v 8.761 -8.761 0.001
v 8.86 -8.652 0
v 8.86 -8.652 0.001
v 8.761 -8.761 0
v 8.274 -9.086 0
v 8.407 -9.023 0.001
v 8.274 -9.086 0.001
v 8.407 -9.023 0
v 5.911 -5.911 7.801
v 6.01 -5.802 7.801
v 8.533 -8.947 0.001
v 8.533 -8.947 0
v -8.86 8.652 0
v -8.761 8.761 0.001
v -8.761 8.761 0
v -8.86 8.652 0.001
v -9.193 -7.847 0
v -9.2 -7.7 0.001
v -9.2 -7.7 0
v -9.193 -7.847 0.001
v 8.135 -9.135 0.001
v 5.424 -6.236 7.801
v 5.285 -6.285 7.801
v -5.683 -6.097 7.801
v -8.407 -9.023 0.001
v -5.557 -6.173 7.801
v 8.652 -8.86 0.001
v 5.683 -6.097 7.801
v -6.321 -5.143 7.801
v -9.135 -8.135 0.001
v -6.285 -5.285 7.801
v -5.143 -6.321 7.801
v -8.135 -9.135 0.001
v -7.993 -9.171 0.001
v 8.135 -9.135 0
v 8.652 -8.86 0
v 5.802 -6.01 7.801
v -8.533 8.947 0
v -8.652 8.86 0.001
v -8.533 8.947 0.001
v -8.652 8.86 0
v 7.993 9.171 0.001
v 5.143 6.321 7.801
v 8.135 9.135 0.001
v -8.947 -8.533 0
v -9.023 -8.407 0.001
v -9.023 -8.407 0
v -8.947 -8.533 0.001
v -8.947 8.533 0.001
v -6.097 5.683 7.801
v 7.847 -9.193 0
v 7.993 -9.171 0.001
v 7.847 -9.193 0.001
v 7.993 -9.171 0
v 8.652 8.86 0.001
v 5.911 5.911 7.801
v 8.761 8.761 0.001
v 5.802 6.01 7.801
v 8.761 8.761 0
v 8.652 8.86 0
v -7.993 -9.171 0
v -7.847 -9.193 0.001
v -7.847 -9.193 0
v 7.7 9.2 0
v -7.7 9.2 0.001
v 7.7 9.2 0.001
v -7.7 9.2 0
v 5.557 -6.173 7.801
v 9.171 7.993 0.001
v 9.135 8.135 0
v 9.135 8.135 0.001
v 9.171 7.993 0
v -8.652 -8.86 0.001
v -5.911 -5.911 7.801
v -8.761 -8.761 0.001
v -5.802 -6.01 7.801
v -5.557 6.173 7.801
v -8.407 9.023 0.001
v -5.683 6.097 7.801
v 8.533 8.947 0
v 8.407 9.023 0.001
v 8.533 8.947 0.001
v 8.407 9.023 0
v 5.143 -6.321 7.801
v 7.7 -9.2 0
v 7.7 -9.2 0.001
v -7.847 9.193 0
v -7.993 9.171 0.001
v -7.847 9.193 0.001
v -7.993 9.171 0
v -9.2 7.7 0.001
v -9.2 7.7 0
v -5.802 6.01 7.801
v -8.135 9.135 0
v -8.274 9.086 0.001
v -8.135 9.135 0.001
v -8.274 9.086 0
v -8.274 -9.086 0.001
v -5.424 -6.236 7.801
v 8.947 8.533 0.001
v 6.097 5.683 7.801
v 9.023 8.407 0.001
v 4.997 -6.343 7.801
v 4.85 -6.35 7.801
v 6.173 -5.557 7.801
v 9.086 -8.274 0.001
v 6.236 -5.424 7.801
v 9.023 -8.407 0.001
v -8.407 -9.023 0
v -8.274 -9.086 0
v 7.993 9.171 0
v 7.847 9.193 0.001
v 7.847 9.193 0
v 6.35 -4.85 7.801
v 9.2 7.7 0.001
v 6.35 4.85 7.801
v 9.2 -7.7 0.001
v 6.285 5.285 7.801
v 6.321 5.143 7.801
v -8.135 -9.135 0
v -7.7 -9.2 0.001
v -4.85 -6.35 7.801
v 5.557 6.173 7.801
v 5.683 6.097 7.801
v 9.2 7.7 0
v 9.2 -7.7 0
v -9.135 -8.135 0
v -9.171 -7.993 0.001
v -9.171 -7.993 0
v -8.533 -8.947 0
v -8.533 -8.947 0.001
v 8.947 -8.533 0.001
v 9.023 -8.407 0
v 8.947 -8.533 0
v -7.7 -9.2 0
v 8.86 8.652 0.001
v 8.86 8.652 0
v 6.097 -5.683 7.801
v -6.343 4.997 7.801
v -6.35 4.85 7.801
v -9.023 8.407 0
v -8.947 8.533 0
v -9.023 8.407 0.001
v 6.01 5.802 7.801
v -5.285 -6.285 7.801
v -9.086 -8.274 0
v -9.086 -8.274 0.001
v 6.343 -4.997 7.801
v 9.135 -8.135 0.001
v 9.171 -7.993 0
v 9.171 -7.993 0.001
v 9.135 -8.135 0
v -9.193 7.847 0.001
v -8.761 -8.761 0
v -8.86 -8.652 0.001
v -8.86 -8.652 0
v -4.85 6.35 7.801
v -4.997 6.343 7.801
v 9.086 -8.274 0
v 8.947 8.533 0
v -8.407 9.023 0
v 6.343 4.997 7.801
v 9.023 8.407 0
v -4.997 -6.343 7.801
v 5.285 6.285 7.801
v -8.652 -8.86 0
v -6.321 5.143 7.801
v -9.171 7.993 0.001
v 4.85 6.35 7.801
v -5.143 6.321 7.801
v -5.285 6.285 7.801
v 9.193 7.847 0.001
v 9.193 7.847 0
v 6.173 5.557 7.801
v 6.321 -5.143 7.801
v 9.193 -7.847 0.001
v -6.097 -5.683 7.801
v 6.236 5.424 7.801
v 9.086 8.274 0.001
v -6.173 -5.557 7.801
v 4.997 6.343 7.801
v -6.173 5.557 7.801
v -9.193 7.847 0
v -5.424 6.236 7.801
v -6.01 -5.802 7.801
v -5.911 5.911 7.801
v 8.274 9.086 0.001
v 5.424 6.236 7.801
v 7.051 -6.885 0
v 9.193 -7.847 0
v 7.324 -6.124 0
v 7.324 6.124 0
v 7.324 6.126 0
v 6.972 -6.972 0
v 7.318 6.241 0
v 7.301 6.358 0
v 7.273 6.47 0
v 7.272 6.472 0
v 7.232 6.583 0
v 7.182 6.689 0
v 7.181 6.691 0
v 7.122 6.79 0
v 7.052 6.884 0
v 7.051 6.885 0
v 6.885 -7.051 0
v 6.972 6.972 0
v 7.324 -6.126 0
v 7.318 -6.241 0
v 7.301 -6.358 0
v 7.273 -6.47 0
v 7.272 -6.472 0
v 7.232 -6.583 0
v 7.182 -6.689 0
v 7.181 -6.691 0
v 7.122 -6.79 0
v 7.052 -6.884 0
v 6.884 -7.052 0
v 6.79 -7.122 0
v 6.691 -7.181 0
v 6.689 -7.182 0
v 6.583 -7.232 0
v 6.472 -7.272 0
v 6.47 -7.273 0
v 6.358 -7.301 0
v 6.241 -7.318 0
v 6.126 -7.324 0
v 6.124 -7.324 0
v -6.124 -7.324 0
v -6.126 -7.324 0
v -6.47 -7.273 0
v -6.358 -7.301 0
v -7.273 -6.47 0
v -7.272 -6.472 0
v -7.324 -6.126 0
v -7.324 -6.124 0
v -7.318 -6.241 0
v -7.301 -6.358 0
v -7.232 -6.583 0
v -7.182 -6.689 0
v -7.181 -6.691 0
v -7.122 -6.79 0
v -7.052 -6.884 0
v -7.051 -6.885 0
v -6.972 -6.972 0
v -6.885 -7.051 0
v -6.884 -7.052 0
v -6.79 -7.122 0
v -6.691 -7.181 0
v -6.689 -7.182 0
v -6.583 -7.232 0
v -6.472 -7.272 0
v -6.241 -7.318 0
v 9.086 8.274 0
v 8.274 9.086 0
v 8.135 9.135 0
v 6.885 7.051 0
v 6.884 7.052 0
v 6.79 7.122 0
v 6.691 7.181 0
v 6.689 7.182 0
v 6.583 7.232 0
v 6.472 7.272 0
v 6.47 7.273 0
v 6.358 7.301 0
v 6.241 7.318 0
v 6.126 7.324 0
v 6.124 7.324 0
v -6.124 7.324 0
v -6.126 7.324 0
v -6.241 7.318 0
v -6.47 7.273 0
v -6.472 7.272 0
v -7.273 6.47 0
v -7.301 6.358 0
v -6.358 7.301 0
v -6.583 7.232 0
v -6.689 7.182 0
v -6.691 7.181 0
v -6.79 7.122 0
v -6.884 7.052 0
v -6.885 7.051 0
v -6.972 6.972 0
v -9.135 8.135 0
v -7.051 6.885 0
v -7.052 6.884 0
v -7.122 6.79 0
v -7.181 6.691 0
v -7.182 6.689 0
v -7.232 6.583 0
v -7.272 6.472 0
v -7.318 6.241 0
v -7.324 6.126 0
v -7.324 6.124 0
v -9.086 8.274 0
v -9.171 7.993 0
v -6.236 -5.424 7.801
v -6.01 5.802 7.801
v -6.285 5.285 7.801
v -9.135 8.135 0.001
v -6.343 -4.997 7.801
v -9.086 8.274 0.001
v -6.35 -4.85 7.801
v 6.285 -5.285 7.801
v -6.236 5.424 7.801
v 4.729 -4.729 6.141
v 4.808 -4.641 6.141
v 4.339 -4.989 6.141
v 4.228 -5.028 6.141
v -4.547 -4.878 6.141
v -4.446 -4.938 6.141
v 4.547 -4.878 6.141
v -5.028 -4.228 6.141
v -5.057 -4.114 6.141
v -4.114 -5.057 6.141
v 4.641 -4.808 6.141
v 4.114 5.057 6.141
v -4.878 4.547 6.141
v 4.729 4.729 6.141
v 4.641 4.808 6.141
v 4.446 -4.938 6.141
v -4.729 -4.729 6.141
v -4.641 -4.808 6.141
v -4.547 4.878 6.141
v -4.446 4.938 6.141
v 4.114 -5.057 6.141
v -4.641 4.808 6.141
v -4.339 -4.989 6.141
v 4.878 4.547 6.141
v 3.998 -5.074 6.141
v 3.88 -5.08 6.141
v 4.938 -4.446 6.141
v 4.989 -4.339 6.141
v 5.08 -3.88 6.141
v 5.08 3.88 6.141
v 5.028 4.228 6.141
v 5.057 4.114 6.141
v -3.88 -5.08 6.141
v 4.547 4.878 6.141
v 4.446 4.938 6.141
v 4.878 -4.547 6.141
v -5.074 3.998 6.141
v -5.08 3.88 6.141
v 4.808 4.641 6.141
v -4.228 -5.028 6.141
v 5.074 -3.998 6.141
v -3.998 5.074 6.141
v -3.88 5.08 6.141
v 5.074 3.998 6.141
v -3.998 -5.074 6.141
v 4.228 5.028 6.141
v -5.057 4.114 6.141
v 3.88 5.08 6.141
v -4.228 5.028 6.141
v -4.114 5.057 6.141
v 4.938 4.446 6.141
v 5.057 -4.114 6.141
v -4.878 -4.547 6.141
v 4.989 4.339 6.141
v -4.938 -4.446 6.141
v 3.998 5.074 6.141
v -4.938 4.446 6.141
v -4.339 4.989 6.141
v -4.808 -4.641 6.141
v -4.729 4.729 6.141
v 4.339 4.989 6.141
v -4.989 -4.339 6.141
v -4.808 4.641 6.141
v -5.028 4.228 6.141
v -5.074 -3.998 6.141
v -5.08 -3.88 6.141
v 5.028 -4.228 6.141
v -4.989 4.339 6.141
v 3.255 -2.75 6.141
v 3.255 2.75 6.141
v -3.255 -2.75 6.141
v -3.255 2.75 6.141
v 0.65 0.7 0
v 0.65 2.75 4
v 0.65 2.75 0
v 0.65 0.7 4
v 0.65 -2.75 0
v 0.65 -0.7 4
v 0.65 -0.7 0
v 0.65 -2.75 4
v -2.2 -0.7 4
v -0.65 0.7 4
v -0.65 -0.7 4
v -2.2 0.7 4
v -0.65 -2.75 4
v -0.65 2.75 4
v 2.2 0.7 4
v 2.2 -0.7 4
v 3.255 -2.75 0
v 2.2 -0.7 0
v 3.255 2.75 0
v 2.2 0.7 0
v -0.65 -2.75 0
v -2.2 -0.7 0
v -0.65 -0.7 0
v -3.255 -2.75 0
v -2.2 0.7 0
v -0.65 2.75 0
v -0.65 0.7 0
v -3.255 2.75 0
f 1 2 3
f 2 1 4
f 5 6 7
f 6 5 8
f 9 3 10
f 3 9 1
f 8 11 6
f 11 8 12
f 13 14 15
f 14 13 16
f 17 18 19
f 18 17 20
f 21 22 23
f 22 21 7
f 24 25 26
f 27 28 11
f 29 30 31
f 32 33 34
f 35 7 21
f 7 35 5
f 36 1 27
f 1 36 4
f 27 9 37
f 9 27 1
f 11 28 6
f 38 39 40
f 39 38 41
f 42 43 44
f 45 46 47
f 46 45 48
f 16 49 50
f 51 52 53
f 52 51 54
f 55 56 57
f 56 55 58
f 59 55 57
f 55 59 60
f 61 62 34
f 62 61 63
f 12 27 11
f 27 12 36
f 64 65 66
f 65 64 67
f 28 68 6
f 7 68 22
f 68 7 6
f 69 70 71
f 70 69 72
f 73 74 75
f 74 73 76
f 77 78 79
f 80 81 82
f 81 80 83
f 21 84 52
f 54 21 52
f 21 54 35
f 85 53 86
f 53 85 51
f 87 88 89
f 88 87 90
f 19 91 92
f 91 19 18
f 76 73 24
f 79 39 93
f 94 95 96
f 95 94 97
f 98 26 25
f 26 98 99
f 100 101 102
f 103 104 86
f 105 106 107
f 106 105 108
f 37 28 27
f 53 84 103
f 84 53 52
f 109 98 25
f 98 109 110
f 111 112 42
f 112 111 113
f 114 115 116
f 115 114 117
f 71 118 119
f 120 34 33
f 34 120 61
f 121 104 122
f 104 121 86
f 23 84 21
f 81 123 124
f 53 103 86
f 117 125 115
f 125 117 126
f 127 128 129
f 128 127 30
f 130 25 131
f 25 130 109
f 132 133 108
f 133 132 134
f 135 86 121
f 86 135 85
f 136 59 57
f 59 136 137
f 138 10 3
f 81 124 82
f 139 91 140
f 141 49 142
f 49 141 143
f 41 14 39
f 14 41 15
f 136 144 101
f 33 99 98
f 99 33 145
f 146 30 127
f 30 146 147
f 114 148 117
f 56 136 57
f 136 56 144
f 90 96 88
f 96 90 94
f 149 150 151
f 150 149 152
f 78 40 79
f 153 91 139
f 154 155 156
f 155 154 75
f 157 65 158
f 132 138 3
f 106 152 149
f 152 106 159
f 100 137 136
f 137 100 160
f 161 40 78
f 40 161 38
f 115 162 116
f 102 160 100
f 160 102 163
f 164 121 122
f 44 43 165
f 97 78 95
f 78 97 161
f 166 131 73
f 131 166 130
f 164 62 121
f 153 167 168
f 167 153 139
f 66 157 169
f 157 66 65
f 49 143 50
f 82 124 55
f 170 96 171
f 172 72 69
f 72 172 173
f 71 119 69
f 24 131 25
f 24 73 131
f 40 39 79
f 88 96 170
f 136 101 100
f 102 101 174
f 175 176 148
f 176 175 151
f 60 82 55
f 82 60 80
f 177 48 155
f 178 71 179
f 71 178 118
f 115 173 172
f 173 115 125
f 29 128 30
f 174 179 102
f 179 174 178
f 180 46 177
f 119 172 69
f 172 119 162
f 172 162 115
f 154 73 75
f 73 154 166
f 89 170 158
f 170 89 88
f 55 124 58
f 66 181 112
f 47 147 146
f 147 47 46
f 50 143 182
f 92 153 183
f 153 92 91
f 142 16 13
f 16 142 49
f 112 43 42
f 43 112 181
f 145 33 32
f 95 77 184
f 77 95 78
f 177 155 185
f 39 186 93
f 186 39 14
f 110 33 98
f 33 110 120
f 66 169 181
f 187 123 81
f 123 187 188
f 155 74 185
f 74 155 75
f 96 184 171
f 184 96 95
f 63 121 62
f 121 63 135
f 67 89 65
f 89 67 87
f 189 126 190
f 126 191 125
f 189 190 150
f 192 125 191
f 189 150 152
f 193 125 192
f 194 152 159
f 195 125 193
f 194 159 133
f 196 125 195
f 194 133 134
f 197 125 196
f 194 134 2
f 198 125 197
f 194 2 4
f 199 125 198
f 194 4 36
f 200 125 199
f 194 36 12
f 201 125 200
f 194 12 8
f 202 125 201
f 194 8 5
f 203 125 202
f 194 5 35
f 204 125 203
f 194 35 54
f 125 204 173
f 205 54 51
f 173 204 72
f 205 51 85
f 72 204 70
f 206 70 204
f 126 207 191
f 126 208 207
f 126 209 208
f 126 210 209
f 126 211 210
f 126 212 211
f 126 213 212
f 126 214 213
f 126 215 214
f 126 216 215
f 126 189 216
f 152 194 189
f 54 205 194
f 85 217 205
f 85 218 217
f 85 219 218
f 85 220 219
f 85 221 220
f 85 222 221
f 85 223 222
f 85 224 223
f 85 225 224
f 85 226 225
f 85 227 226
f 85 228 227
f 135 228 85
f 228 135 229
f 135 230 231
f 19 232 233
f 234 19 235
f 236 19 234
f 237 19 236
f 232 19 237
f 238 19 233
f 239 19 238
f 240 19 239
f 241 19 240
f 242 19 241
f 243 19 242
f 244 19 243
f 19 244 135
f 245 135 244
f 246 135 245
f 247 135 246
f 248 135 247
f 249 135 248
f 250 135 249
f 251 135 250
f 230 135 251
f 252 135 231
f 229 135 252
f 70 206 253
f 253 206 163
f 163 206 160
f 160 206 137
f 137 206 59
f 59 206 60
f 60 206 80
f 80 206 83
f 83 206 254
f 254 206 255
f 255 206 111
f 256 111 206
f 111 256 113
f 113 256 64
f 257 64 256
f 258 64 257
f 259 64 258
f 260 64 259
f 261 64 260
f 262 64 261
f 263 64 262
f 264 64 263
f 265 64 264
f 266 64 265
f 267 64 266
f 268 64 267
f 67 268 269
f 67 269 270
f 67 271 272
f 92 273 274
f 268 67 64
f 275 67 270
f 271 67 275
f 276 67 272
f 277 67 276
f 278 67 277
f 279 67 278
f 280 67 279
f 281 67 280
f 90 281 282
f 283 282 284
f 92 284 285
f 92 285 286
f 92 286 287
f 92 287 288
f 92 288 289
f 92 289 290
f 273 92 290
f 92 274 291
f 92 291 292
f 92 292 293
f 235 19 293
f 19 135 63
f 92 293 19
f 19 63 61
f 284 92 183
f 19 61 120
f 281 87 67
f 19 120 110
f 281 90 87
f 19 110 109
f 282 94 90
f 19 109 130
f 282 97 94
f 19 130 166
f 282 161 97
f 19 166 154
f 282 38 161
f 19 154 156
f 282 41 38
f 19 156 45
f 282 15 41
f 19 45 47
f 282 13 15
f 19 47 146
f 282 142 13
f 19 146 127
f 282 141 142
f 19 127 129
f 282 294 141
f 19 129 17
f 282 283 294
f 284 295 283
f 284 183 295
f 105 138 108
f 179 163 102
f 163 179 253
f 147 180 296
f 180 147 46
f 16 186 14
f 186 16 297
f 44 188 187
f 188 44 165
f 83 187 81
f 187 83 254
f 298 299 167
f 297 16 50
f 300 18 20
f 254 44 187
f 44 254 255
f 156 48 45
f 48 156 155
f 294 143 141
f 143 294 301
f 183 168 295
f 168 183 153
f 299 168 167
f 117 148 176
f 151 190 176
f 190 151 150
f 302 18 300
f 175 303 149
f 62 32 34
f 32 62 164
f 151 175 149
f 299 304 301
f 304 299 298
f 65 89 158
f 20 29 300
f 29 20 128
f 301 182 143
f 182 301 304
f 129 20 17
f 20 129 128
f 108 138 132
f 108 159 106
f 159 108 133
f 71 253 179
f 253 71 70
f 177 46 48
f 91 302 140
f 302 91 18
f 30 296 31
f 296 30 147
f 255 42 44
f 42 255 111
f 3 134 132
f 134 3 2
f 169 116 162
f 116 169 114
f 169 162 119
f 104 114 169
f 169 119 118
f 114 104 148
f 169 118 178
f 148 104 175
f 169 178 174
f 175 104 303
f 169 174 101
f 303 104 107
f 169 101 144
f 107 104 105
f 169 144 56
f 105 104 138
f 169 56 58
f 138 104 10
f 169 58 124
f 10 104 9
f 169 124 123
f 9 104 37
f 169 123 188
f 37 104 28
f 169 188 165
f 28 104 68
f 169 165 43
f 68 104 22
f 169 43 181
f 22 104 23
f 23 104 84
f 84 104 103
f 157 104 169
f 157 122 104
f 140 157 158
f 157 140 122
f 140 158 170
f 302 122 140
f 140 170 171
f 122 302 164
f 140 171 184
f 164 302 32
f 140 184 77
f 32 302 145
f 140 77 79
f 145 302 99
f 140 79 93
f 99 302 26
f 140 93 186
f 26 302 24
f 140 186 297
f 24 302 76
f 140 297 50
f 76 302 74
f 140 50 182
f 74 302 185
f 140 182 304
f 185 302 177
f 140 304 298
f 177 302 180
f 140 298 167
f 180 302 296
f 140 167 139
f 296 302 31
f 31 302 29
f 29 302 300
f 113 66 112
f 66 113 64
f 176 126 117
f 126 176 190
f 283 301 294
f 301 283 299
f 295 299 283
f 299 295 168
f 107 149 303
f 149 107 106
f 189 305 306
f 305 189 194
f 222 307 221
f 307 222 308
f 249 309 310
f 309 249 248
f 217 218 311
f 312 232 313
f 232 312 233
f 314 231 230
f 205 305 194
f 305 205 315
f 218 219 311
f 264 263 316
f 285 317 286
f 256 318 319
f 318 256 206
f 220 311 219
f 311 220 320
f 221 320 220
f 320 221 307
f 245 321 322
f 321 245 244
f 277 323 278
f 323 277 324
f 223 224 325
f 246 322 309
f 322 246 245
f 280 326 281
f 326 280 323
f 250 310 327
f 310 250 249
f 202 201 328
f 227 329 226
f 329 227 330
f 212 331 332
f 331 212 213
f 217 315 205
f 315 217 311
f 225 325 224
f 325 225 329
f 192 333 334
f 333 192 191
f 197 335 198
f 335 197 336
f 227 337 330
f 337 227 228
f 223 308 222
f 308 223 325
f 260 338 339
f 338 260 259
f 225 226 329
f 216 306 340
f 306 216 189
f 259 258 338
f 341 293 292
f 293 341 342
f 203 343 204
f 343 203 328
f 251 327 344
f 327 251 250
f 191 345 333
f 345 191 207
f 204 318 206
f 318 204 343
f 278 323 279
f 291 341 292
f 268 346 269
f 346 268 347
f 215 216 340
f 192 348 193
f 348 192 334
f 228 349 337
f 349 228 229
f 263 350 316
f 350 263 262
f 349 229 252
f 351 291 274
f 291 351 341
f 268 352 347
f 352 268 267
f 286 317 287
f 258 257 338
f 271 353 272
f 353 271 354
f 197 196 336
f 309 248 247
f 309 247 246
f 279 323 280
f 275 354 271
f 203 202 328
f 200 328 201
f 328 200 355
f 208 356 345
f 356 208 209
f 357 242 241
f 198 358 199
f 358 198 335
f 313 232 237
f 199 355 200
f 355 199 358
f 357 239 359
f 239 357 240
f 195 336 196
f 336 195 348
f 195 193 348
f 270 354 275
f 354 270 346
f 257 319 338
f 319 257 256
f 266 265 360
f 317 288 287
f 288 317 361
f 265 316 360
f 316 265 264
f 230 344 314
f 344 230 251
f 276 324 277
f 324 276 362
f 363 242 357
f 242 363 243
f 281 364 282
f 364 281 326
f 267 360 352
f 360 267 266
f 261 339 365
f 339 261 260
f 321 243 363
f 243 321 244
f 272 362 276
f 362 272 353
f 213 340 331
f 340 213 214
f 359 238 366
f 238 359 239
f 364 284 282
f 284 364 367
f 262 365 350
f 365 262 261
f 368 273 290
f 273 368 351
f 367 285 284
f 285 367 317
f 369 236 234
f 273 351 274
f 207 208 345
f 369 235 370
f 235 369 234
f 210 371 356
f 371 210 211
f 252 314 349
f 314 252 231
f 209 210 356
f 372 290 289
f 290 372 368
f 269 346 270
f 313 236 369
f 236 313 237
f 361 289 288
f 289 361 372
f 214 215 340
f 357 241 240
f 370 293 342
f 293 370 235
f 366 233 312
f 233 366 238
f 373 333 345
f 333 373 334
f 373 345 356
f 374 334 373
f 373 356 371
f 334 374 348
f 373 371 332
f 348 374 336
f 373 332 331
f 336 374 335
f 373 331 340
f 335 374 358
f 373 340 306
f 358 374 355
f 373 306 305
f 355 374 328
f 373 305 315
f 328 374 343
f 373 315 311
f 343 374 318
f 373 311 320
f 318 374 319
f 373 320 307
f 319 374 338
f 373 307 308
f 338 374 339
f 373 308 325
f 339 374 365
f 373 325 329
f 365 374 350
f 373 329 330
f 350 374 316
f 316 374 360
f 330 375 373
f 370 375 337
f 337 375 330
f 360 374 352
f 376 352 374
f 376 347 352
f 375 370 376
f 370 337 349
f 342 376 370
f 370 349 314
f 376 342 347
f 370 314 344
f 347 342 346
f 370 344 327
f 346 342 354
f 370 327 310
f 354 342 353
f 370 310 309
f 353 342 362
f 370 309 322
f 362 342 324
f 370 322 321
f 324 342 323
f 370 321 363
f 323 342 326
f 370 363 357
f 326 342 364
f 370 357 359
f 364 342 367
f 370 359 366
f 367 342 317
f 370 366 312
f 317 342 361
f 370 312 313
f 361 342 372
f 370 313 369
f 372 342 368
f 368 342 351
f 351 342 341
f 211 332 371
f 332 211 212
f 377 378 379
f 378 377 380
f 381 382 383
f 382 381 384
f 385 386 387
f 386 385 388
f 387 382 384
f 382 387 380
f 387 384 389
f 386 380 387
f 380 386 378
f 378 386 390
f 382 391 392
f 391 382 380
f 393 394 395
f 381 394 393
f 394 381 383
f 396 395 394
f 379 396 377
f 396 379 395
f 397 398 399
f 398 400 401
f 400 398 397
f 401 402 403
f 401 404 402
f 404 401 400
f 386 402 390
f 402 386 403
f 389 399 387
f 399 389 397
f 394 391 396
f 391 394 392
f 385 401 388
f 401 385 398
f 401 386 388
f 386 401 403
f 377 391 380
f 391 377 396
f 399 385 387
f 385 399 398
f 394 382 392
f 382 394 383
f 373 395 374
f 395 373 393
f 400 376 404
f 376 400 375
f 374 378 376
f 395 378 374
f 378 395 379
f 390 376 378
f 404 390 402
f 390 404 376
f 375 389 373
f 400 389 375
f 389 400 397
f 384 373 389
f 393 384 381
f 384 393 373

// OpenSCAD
// Row 5? Cherry MX key
//change to round things better
$fn = 64;

//scale of inner to outer shape
key_wall_thickness_width =  .8;
key_wall_thickness_height = .8;
key_wall_thickness_depth =  .8;
//length in units of key
key_length = 1;

// dimensions of cross
// horizontal cross bar width
horizontal_cross_width = 1.4;
// vertical cross bar width
vertical_cross_width = 1.3;
// cross length
cross_length = 4.4;
//extra vertical cross length - change if you dont want the cruciform to be in 2 parts
extra_vertical_cross_length = 2;

//dimensions of connector
// outer cross extra length in x
extra_outer_cross_width = 2.11;
// outer cross extra length in y
extra_outer_cross_height = 1.1;
// cross depth, stem height is 3.4mm
cross_depth = 4;

//connector brim
//enable brim for connector
has_brim = 0;
//brim radius
brim_radius = 6;
//brim depth
brim_depth = .3;

//keycap type, [0..6]
key_type = 5;


//profile specific stuff

/*god, I would love a class right here
 here we have, for lack of a better implementation, an array
 that defines the more intimate aspects of a key.
 order is thus:
 1. Bottom Key Width: width of the immediate bottom of the key
 2. Bottom Key Height: height of the immediate bottom of the key
 3. Top Key Width Difference: mm to subtract from bottom key width to create top key width
 4. Top Key Height Difference: mm to subtract from bottom key height to create top key height
 5. total Depth: how tall the total in the switch is before dishing
 6. Top Tilt: X rotation of the top. Top and dish obj are rotated
 7. Top Skew: Y skew of the top of the key relative to the bottom. DCS has some, DSA has none (its centered)
 8. Dish Type: type of dishing. currently sphere and cylinder
 9. Dish Depth: how many mm to cut into the key with
 10. Dish Radius: radius of dish obj, the Sphere or Cylinder that cuts into the keycap
*/

key_profiles = [

	//DCS Profile

	[ //DCS ROW 5...erm...ish
		18.16,  // Bottom Key Width
		18.16,  // Bottom Key Height
		6,   // Top Key Width Difference
		4,   // Top Key Height Difference
		11.5, // total Depth
		-6,  // Top Tilt
		1.75,// Top Skew

		//Dish Profile

		0,   // Dish Type
		1,   // Dish Depth
		40,  // Dish Radius
		0,   // Dish Skew X
		0    // DIsh Skew Y
	],
	[ //DCS ROW 1
		18.16,  // Bottom Key Width
		18.16,  // Bottom Key Height
		6,   // Top Key Width Difference
		4,   // Top Key Height Difference
		8.5, // total Depth
		-1,  // Top Tilt
		1.75,// Top Skew

		//Dish Profile

		0,   // Dish Type
		1,   // Dish Depth
		40,  // Dish Radius
		0,   // Dish Skew X
		0    // DIsh Skew Y
	],
	[ //DCS ROW 2
		18.16,  // Bottom Key Width
		18.16,  // Bottom Key Height
		6.2,   // Top Key Width Difference
		4,   // Top Key Height Difference
		7.5, // total Depth
		3,  // Top Tilt
		1.75,// Top Skew

		//Dish Profile

		0,   // Dish Type
		1,   // Dish Depth
		40,  // Dish Radius
		0,   // Dish Skew X
		0    // DIsh Skew Y
	],
	[ //DCS ROW 3
		18.16,  // Bottom Key Width
		18.16,  // Bottom Key Height
		6,   // Top Key Width Difference
		4,   // Top Key Height Difference
		6.2, // total Depth
		7,  // Top Tilt
		1.75,// Top Skew

		//Dish Profile

		0,   // Dish Type
		1,   // Dish Depth
		40,  // Dish Radius
		0,   // Dish Skew X
		0    // DIsh Skew Y
	],
	[ //DCS ROW 4
		18.16,  // Bottom Key Width
		18.16,  // Bottom Key Height
		6,   // Top Key Width Difference
		4,   // Top Key Height Difference
		6.2, // total Depth
		16,  // Top Tilt
		1.75,// Top Skew

		//Dish Profile

		0,   // Dish Type
		1,   // Dish Depth
		40,  // Dish Radius
		0,   // Dish Skew X
		0    // DIsh Skew Y
	],

	//DSA Profile (array index 5)

	[ //DSA ROW 3
	  18.4,  // Bottom Key Width
	  18.4,  // Bottom Key Height
	  5.7, // Top Key Width Difference
	  5.7, // Top Key Height Difference
	  7.8, // total Depth
	  0,   // Top Tilt
	  0,   // Top Skew

	  //Dish Profile

	  1,   // Dish Type
	  0,//1, // Dish Depth
	  40,   // Dish Radius
	  0,   // Dish Skew X
		0    // DIsh Skew Y
	],

	//SA Proile

	[ //SA ROW 1
		18.4,  // Bottom Key Width
	  18.4,  // Bottom Key Height
	  5.7, // Top Key Width Difference
	  5.7, // Top Key Height Difference
	  13.73, // total Depth, fudged
	  0,   // Top Tilt
	  0,   // Top Skew

	  //Dish Profile

	  1,   // Dish Type
	  2, // Dish Depth
	  30,   // Dish Radius
		3,   // Dish Skew X
		0    // DIsh Skew Y
	],
	[ //SA ROW 2
		18.4,  // Bottom Key Width
	  18.4,  // Bottom Key Height
	  5.7, // Top Key Width Difference
	  5.7, // Top Key Height Difference
	  11.73, // total Depth
	  0,   // Top Tilt
	  0,   // Top Skew

	  //Dish Profile

	  1,   // Dish Type
	  2, // Dish Depth
	  30,   // Dish Radius
		3,   // Dish Skew X
		0    // DIsh Skew Y
	],
	[ //SA ROW 3
		18.4,  // Bottom Key Width
	  18.4,  // Bottom Key Height
	  5.7, // Top Key Width Difference
	  5.7, // Top Key Height Difference
	  11.73, // total Depth
	  0,   // Top Tilt
	  0,   // Top Skew

	  //Dish Profile

	  1,   // Dish Type
	  1.6, // Dish Depth
	  30,   // Dish Radius
		0,   // Dish Skew X
		0    // DIsh Skew Y
	],
	[ //SA ROW 4
		18.4,  // Bottom Key Width
	  18.4,  // Bottom Key Height
	  5.7, // Top Key Width Difference
	  5.7, // Top Key Height Difference
	  11.73, // total Depth
	  0,   // Top Tilt
	  0,   // Top Skew

	  //Dish Profile

	  1,   // Dish Type
	  2, // Dish Depth
	  30,   // Dish Radius
		-3,   // Dish Skew X
		0    // DIsh Skew Y
	]
];

//libraries
//centered
module roundedRect(size, radius) {
	x = size[0];
	y = size[1];
	z = size[2];

	translate([-x/2,-y/2,0])
	linear_extrude(height=z)
	hull() {
		translate([radius, radius, 0])
		circle(r=radius);

		translate([x - radius, radius, 0])
		circle(r=radius);

		translate([x - radius, y - radius, 0])
		circle(r=radius);

		translate([radius, y - radius, 0])
		circle(r=radius);
	}
}

//end libraries

//dish selector
module dish(key_profile){
	total_depth = key_profile[4];
	top_tilt = key_profile[5];
	top_skew = key_profile[6];
	dish_type = key_profile[7];
	dish_depth = key_profile[8];
	dish_radius = key_profile[9];
	dish_skew_x = key_profile[10];
	dish_skew_y = key_profile[11];

	if(dish_type == 0){
		translate([dish_skew_x, top_skew + dish_skew_y, total_depth])
		rotate([90-top_tilt,0,0])
		translate([0,dish_radius-dish_depth,0])
		scale([key_length,1,1])
		cylinder(h=100,r=dish_radius, $fn=1024, center=true);
	}
	else {
		translate([dish_skew_x, top_skew + dish_skew_y, total_depth])
		rotate([90-top_tilt,0,0])
		translate([0,dish_radius-dish_depth,0])
		scale([key_length,1,1])
		sphere(r=dish_radius, $fn=256);
	}
}

//i h8 u scad
module shape(key_profile){

	bottom_key_width = key_profile[0];
	bottom_key_height = key_profile[1];
	top_key_width_difference = key_profile[2];
	top_key_height_difference = key_profile[3];
	total_depth = key_profile[4];
	top_tilt = key_profile[5];
	top_skew = key_profile[6];

  difference(){
		hull(){
			roundedRect([bottom_key_width*key_length,bottom_key_height,.001],1.5);

			translate([0,top_skew,total_depth])
			rotate([-top_tilt,0,0])
			roundedRect([bottom_key_width*key_length-top_key_width_difference,bottom_key_height-top_key_height_difference,.001],1.5);
		}
		dish(key_profile);
	}
}

// inside of connector
module cross(){
    translate([0,0,(cross_depth)/2])
    union(){
        cube([vertical_cross_width,cross_length+extra_vertical_cross_length,cross_depth], center=true );//remove +2 to print with cross
        cube([cross_length,horizontal_cross_width,cross_depth], center=true );
    }
}

//whole connector
module connector(key_profile,has_brim){
	difference(){
		difference(){
			union(){
				translate(
					[
		 			-(cross_length+extra_outer_cross_width)/2,
		 			-(cross_length+extra_outer_cross_height)/2,
		 			0
					]
				)
				cube([cross_length+extra_outer_cross_width,cross_length+extra_outer_cross_height,50]);
				if (has_brim == 1){ cylinder(r=brim_radius,h=brim_depth); }
			}
			cross();
		}
		bottom(key_profile);
	}
}

//bottom we can use to anchor things
module bottom(key_profile)
{
	difference(){
		translate([0,0,50])
		cube([100,100,100],center=true);

		translate([0,0,-.1])
		scale([key_wall_thickness_width,key_wall_thickness_height,key_wall_thickness_depth])
		shape(key_profile);
	}
}

//actual full key with space carved out and keystem
module key(key_profile){
	union(){
		difference(){
			shape(key_profile);

			translate([0,0,-.1])
			scale([key_wall_thickness_width,key_wall_thickness_height,key_wall_thickness_depth])
			shape(key_profile);
		}
		connector(key_profile,has_brim);
	}
}


union() {
  key(key_profiles[key_type]);
  //translate([0,4,7]) cylinder(height=1, r1=1, r2=0);
}
